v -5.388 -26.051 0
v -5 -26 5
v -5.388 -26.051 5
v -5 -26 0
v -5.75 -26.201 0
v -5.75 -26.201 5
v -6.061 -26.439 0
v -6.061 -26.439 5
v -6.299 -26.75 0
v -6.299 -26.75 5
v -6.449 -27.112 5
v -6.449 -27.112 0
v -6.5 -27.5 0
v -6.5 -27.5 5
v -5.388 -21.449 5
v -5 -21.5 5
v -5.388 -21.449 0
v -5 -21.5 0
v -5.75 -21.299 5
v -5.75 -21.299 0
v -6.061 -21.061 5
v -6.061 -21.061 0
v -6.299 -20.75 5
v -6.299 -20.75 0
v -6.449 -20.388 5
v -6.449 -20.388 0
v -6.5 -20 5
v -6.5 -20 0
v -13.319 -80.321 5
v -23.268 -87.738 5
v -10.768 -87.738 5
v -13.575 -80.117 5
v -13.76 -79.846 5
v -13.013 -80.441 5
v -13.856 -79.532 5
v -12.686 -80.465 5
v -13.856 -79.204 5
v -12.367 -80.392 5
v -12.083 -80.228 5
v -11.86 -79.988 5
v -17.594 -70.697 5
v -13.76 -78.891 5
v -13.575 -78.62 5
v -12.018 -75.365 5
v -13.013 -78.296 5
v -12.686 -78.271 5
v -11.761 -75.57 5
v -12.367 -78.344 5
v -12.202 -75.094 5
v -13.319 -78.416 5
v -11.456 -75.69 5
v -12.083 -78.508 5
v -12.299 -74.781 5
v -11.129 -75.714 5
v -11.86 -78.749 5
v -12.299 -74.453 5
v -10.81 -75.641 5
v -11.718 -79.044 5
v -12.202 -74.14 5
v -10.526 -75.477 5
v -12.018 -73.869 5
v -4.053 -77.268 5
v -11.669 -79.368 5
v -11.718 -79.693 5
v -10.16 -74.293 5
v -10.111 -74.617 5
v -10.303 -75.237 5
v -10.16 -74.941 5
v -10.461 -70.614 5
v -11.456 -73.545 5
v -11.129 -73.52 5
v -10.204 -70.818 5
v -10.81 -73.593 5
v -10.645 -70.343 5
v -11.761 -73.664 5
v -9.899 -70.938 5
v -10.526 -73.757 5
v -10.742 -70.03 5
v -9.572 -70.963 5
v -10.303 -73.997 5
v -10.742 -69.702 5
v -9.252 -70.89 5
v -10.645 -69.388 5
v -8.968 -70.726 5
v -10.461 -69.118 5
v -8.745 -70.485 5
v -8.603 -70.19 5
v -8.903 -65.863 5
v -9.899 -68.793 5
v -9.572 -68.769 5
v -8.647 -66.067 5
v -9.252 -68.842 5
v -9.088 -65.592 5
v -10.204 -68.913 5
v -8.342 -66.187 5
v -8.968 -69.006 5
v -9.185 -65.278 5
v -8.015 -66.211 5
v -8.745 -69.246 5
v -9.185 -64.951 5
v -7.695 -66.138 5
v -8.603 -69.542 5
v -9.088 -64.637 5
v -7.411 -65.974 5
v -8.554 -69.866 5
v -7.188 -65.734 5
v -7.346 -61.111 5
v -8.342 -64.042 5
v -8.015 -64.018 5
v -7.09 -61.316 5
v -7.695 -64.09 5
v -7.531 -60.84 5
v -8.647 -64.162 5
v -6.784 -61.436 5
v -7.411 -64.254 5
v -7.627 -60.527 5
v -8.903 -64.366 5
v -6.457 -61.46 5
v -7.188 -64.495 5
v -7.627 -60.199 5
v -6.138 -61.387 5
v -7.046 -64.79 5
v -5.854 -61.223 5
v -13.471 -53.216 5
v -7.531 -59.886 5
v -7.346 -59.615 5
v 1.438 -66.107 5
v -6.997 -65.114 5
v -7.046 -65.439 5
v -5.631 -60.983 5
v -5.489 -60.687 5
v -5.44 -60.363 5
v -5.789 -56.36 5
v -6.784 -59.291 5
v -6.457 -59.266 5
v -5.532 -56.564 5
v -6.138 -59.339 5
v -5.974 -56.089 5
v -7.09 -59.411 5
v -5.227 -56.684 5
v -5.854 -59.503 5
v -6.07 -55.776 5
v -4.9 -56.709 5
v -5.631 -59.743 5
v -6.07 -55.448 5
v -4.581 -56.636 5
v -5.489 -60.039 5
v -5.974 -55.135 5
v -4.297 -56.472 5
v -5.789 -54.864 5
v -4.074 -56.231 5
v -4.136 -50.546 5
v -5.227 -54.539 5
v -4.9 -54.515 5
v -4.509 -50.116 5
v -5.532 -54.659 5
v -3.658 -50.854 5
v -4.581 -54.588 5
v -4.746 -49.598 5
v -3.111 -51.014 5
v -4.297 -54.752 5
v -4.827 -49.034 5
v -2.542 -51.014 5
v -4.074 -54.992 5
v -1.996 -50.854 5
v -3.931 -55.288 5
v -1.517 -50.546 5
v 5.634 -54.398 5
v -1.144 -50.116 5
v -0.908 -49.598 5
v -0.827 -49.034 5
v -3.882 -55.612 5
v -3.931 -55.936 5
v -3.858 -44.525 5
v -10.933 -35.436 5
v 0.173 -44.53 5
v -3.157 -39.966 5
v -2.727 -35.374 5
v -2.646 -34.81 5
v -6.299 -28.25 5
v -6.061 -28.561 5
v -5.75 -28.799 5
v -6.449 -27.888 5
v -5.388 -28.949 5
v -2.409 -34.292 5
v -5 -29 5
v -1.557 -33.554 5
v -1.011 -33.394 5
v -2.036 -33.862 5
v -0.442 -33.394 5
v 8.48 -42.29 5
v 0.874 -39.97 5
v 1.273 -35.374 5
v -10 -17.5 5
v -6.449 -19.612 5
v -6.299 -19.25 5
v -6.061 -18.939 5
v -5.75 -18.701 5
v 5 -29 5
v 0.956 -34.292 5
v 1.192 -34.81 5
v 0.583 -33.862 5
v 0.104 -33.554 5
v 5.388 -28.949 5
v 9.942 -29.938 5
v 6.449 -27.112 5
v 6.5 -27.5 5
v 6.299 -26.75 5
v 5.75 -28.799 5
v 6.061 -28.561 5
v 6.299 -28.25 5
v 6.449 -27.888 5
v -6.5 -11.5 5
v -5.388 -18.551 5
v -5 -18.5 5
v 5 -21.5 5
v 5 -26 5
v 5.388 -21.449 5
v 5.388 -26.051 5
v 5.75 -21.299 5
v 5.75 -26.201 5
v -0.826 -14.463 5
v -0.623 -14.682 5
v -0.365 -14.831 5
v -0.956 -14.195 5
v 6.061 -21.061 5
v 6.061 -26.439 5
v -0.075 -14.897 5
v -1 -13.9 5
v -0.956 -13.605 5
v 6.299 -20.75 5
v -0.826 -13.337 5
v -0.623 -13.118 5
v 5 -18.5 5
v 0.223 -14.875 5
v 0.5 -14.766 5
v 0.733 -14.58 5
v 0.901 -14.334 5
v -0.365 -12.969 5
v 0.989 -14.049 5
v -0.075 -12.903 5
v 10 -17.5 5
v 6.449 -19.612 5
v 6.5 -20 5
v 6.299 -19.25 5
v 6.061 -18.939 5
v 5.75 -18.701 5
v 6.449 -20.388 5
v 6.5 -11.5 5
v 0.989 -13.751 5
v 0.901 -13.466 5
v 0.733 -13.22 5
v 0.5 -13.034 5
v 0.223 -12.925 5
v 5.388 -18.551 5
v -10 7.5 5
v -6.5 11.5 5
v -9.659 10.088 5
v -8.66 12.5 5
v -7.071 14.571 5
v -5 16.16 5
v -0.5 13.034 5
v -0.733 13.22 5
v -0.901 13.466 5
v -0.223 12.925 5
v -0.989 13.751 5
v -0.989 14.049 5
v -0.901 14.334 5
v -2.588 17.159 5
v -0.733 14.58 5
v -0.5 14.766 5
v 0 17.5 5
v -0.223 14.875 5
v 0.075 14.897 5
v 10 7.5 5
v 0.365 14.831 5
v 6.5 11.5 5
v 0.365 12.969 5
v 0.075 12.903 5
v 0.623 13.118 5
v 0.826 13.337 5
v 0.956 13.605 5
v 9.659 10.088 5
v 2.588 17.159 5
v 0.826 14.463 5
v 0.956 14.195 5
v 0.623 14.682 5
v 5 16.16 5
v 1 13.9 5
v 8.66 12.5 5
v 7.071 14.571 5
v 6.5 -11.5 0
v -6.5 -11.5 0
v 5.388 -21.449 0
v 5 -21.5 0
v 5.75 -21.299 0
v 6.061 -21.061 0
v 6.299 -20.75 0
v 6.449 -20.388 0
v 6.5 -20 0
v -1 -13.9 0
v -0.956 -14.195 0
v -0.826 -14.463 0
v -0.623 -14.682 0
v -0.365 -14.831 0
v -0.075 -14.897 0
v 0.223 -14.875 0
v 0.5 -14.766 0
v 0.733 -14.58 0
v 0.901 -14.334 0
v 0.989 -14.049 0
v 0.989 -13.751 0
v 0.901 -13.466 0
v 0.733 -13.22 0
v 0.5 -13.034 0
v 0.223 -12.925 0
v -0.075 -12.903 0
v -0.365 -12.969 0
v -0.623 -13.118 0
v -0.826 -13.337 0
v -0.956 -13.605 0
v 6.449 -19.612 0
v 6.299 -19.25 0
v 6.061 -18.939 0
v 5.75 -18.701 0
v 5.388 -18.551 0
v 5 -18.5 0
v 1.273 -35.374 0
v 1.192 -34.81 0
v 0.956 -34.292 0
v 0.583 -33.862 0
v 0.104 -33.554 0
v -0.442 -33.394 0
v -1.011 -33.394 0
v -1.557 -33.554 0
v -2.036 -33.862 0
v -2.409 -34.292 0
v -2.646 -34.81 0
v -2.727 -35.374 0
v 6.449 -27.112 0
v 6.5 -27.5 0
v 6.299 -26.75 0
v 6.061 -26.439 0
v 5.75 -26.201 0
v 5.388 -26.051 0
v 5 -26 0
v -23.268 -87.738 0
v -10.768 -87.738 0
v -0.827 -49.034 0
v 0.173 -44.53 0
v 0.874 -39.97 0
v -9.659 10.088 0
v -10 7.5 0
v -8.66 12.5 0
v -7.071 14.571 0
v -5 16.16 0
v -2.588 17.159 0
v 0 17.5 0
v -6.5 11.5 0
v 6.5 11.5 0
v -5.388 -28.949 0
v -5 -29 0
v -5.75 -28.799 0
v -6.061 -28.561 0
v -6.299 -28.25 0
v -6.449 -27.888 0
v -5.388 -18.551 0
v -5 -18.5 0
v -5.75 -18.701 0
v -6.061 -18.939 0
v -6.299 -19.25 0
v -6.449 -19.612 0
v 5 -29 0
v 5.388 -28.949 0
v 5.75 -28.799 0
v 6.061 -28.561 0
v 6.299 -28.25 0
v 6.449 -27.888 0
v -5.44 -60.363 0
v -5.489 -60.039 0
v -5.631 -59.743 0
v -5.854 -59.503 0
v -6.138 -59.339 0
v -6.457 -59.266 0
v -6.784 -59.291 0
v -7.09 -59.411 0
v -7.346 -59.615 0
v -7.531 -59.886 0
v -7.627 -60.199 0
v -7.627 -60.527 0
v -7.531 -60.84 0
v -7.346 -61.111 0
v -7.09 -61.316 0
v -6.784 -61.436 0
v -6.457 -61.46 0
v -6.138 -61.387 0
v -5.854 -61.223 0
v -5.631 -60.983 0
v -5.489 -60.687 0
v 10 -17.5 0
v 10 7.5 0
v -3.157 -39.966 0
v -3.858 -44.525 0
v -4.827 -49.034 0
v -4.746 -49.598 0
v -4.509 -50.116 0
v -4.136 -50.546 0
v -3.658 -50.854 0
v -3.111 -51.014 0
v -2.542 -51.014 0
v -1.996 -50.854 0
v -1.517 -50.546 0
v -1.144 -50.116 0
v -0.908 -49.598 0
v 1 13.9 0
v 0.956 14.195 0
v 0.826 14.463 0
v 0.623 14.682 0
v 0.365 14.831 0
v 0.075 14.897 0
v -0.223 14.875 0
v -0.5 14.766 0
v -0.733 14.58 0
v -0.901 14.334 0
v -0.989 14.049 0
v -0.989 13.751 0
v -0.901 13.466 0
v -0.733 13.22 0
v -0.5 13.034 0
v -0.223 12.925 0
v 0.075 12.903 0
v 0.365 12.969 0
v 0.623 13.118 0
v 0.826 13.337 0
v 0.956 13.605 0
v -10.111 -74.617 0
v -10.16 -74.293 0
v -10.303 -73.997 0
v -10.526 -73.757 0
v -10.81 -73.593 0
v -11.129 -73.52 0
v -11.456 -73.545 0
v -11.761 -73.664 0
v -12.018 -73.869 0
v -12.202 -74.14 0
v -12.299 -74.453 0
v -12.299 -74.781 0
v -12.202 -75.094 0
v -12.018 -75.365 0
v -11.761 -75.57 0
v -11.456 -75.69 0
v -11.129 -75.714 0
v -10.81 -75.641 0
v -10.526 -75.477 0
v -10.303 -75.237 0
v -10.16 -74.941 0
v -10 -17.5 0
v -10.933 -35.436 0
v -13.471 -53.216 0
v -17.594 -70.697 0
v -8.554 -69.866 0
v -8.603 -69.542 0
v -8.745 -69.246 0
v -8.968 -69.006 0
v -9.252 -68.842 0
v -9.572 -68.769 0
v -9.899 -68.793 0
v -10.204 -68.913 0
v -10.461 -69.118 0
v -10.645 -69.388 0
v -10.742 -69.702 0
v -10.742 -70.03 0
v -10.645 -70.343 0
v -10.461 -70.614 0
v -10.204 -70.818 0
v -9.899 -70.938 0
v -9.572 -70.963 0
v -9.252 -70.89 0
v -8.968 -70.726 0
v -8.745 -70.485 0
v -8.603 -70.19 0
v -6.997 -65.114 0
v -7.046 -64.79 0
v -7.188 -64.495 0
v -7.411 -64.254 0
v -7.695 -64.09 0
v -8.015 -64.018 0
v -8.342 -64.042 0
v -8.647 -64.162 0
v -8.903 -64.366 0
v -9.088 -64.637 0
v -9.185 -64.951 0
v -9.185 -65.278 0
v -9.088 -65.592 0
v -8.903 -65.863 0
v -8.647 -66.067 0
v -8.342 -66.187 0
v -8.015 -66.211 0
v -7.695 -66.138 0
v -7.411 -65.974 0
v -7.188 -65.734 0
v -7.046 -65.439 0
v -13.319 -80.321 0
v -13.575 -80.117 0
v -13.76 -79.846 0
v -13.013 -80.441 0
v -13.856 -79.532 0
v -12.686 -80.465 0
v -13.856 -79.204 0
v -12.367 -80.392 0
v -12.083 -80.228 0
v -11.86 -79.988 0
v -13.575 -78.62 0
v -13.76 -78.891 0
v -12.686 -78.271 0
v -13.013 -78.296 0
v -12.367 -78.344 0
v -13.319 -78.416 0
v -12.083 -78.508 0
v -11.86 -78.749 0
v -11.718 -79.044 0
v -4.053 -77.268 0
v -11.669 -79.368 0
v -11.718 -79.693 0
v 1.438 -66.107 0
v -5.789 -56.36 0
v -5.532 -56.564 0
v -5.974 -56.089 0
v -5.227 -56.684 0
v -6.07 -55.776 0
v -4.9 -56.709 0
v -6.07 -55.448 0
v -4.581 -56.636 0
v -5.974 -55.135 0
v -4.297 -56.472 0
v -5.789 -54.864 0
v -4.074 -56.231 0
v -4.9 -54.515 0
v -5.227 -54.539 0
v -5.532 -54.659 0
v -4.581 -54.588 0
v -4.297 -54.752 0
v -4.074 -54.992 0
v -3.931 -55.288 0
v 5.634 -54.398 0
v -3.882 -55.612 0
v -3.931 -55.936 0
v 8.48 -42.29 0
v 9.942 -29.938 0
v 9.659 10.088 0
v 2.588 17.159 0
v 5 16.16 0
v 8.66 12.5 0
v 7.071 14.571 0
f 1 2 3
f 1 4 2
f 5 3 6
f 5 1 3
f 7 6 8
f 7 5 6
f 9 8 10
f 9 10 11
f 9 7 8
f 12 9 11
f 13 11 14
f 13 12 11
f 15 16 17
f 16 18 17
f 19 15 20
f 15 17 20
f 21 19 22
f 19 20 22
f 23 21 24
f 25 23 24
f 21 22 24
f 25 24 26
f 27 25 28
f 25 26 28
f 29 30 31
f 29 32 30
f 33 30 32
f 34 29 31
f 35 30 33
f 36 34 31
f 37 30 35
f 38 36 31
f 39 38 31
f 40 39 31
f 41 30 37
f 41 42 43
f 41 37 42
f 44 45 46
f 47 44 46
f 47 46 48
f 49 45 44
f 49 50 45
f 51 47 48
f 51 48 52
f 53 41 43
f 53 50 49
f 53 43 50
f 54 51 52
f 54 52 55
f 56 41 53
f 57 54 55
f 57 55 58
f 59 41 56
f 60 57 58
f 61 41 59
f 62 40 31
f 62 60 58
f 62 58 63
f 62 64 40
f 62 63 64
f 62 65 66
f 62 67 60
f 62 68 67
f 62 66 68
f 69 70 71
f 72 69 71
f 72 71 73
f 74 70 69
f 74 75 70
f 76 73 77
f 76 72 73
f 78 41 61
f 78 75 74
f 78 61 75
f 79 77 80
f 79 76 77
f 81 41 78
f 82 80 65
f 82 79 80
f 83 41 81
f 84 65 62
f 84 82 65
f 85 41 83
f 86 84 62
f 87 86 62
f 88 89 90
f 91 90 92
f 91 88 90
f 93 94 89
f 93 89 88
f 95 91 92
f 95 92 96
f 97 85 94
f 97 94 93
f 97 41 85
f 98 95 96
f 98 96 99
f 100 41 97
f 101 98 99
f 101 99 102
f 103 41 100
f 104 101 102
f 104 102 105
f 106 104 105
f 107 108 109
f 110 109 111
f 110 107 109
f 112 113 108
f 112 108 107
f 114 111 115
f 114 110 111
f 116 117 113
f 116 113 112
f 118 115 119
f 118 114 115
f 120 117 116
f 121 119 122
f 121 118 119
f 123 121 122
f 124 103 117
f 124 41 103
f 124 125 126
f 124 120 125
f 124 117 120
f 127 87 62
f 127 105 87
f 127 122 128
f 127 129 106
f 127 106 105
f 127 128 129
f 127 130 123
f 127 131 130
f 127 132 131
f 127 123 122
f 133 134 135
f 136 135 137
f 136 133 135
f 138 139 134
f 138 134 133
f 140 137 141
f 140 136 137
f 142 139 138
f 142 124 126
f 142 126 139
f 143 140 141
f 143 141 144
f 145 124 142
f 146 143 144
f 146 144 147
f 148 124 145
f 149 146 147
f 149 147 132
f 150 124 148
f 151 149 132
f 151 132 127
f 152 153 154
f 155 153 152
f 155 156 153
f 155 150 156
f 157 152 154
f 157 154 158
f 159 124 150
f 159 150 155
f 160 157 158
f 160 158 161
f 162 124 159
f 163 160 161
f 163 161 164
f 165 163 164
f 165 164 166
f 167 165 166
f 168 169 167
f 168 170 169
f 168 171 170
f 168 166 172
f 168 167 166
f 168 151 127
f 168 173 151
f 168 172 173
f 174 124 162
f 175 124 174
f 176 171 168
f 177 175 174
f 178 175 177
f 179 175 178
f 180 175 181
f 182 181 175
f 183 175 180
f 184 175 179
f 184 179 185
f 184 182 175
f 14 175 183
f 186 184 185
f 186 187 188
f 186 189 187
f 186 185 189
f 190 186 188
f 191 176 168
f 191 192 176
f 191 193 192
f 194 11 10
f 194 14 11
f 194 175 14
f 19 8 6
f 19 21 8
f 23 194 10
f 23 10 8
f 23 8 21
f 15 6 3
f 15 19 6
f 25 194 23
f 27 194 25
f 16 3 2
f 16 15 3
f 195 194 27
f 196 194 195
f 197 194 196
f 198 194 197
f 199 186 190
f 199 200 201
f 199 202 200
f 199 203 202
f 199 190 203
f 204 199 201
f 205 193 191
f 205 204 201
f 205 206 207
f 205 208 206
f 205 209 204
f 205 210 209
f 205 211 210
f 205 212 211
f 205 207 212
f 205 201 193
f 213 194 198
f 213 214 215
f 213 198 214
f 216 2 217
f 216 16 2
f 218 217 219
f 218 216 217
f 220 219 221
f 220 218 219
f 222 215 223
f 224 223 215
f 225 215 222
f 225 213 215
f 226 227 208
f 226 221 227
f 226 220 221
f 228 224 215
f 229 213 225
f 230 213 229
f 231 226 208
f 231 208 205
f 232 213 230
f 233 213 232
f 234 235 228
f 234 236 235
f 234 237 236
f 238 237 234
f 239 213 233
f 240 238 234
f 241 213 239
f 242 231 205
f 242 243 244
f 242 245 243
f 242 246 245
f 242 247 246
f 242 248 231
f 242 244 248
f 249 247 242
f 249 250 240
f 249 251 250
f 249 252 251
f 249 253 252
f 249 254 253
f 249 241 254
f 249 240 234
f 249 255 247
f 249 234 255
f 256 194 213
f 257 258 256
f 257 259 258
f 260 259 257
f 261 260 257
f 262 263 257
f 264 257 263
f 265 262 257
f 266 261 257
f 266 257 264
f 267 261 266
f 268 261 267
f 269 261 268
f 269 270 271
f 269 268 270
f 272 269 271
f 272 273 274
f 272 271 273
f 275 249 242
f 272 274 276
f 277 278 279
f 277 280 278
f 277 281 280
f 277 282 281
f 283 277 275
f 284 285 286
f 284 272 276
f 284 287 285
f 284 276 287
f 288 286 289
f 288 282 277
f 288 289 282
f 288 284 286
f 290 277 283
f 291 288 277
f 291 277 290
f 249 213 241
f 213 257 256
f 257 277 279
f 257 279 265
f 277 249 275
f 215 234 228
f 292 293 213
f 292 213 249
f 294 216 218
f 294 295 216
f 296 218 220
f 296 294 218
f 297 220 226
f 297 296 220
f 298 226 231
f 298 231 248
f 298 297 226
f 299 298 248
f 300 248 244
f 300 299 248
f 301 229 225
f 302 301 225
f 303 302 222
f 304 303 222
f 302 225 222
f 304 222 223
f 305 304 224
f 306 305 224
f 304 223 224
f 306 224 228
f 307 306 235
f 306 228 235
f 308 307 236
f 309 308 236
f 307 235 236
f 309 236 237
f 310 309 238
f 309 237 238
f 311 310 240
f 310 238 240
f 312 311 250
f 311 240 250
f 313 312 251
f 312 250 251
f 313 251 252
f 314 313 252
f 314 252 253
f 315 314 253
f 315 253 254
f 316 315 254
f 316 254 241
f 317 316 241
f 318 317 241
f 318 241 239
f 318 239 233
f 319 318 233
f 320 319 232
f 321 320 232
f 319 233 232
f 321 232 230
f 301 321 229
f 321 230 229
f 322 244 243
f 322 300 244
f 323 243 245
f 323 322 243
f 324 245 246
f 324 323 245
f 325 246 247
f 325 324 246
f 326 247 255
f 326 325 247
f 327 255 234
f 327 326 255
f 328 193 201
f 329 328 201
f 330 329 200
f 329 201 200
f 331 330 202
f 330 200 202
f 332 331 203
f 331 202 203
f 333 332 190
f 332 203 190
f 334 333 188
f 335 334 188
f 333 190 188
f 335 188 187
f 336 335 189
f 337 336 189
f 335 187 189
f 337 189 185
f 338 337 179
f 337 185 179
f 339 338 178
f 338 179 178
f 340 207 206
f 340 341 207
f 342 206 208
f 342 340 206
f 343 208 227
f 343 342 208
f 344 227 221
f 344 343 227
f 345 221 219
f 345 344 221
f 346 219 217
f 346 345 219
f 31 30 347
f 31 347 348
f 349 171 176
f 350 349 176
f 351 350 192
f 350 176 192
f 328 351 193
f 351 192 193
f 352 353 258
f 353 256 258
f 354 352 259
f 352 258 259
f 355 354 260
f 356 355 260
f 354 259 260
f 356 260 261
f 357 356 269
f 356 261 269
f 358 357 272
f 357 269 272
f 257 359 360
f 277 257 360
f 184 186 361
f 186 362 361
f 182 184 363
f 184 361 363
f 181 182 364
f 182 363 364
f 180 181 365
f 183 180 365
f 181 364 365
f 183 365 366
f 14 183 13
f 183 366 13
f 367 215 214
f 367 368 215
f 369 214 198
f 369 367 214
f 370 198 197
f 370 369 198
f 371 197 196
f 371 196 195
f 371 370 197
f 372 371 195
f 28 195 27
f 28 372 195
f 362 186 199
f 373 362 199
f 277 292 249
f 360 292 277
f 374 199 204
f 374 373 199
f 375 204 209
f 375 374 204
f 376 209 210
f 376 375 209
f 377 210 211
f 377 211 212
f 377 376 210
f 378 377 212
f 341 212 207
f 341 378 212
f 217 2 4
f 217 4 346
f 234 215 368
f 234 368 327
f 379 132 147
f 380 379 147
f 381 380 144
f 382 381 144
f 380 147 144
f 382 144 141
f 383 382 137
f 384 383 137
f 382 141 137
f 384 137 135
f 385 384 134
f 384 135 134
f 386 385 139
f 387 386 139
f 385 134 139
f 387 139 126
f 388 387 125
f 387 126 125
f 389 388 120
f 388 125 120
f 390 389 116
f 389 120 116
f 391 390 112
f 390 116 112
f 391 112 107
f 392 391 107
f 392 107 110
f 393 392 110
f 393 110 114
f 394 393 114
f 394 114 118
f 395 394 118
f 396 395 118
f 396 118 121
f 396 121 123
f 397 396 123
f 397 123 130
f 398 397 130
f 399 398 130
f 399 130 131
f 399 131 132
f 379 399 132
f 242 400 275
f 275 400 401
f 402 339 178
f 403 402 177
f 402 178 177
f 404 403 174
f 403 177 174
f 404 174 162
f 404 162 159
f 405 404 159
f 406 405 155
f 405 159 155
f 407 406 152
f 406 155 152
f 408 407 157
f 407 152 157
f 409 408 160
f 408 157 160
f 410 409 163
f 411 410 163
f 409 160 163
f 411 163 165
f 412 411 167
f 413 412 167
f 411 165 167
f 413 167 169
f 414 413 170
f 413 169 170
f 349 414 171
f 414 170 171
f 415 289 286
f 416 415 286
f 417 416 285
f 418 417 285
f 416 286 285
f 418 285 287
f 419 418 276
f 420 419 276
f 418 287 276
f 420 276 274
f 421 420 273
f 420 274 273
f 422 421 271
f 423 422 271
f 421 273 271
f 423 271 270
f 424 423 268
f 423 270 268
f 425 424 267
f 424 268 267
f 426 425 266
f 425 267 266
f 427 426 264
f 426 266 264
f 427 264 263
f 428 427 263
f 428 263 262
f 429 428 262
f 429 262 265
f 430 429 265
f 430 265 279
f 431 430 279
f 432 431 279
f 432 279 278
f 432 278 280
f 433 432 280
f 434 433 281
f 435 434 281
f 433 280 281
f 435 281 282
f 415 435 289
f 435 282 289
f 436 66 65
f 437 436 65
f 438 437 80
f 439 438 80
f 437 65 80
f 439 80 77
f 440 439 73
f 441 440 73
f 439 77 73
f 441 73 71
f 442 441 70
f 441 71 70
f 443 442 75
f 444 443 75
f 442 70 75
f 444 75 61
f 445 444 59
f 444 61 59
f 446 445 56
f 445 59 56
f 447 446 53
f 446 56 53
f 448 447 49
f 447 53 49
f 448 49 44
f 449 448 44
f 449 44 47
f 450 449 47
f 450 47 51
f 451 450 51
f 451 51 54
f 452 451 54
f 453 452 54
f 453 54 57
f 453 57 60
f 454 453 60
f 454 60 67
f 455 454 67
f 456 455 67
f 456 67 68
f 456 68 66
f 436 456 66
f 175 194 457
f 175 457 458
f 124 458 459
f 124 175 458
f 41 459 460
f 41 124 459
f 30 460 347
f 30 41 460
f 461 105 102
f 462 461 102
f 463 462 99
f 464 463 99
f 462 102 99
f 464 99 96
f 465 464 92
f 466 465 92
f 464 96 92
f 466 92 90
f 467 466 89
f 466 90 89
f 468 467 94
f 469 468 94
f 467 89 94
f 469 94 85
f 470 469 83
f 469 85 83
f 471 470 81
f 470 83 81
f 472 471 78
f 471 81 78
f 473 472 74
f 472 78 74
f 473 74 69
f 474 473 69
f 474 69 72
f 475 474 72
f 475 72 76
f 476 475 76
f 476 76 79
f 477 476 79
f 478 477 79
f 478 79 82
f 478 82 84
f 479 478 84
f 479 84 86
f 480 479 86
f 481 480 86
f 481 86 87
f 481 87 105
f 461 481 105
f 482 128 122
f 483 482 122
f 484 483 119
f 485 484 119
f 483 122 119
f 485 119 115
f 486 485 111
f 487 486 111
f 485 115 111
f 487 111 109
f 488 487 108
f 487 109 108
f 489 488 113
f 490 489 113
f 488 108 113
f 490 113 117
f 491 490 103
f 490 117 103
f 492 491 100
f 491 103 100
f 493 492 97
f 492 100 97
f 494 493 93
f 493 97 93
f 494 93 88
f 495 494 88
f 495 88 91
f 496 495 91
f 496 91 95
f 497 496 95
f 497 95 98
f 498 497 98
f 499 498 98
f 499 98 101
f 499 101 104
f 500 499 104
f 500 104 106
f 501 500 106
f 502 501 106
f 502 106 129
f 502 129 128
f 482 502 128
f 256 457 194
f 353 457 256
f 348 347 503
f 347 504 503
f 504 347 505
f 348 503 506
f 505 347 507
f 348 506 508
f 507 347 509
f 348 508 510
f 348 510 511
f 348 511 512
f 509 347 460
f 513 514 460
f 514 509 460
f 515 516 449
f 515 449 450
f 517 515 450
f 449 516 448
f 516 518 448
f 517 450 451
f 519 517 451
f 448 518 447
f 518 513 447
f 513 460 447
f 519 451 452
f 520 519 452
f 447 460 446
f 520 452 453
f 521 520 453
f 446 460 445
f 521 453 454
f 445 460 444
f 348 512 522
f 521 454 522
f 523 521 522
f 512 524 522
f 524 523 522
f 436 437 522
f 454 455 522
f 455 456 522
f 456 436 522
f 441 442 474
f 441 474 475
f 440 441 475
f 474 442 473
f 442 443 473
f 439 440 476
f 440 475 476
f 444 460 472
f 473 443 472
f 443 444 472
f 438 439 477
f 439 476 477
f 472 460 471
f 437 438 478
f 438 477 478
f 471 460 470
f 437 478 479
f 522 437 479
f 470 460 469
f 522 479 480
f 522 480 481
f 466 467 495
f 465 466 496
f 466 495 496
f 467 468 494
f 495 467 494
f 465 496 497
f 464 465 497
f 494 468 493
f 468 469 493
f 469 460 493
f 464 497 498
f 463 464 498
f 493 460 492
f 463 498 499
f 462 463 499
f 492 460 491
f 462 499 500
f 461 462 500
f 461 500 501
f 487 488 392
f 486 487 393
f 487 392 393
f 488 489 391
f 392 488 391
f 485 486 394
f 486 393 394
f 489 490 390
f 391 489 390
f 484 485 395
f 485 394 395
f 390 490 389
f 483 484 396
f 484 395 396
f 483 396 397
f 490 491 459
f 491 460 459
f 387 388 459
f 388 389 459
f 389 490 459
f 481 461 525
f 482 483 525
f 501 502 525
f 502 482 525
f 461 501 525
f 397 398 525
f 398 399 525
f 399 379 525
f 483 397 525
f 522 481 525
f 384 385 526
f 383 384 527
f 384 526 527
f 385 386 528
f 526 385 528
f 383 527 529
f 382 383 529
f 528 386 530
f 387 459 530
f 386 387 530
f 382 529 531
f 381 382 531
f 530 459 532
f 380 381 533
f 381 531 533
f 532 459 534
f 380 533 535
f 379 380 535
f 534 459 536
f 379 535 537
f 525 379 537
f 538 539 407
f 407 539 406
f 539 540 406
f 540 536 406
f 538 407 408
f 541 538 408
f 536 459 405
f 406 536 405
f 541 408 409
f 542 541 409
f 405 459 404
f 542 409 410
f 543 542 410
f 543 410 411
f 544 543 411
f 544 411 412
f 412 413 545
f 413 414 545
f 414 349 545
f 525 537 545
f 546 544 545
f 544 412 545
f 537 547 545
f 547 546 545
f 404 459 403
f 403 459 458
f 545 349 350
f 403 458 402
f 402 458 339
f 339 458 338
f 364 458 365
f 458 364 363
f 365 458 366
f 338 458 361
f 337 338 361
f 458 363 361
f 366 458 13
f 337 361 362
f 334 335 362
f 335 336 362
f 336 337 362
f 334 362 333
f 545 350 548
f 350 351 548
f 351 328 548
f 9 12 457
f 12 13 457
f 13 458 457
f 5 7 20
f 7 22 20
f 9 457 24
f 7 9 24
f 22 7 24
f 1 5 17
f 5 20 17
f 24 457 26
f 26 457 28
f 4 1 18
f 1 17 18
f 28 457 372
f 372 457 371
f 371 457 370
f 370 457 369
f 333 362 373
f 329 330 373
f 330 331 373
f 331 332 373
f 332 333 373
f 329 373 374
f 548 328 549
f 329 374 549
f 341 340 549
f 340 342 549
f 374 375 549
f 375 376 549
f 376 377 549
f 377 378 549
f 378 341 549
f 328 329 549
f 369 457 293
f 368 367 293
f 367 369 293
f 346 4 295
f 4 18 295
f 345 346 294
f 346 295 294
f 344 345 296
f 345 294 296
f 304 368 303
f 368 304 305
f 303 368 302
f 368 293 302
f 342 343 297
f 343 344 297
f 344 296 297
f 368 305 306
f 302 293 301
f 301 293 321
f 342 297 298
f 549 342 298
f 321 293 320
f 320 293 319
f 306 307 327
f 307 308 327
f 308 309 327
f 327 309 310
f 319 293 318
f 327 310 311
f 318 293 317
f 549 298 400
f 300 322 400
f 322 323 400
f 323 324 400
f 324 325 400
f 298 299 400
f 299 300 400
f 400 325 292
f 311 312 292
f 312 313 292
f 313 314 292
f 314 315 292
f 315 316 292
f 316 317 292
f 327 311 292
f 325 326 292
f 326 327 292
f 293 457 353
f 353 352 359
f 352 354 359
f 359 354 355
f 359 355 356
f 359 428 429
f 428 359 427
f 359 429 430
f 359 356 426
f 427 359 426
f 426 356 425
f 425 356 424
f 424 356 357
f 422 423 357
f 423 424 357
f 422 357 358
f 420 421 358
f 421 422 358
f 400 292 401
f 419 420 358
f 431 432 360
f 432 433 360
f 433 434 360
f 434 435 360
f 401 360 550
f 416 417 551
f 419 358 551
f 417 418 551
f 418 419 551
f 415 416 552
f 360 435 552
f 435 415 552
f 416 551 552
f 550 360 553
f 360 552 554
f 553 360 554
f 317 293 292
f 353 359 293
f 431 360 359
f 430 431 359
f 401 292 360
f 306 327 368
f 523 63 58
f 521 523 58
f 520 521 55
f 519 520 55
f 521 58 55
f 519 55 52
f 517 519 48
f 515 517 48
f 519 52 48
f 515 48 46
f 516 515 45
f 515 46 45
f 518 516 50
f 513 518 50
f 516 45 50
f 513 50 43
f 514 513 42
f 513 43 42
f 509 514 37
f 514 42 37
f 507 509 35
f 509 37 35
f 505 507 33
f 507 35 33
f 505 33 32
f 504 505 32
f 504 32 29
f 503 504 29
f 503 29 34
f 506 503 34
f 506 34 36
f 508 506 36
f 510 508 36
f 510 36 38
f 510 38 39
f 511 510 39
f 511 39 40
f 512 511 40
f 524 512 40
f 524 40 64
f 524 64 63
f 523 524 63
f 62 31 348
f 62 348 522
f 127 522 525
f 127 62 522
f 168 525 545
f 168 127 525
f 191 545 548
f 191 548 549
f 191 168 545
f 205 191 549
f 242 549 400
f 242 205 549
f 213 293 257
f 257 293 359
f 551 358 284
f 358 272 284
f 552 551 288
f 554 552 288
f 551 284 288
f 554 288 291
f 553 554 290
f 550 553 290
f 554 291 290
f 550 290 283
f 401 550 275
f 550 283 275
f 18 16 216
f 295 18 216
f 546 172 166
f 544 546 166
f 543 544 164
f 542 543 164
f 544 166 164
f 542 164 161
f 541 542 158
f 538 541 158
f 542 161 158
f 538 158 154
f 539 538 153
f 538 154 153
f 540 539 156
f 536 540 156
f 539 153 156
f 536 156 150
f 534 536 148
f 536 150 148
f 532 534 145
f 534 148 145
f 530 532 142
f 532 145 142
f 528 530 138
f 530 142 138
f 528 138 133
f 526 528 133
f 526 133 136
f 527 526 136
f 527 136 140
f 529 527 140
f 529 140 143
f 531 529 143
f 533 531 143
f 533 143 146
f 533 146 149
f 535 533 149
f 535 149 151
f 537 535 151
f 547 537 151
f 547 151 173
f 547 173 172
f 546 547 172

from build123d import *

# Parameters (mm, degrees)
SKETCH1_W           = 20
SKETCH1_H           = 35
SKETCH1_W_2         = 13
SKETCH1_H_2         = 23
BOSS_EXTRUDE1_DEPTH = 5
SKETCH2_R           = 1
CUT_EXTRUDE1_DEPTH  = 5
BOSS_EXTRUDE2_DEPTH = 5
FILLET1_R           = 10
SKETCH6_R           = 1.1
CUT_EXTRUDE2_DEPTH  = 10
SKETCH7_W           = 13
SKETCH7_H           = 3
CUT_EXTRUDE3_DEPTH  = 10
FILLET2_R           = 1.5


with BuildPart() as part:
    # Sketch1 → Boss-Extrude1 (new body)
    with BuildSketch(Plane.XY):
        Rectangle(SKETCH1_W, SKETCH1_H)
        Rectangle(SKETCH1_W_2, SKETCH1_H_2, mode=Mode.SUBTRACT)
    extrude(amount=BOSS_EXTRUDE1_DEPTH)

    # Sketch2 → Cut-Extrude1 (cut)
    with BuildSketch(Plane.XY.offset(5)):
        with Locations((0, 13.9)):
            Circle(SKETCH2_R)
        with Locations(Location((0, -13.9, 0), (0, 0, 180))):
            Circle(SKETCH2_R)
    extrude(amount=-CUT_EXTRUDE1_DEPTH, mode=Mode.SUBTRACT)

    # Sketch4 → Boss-Extrude2 (add)
    with BuildSketch(Plane.XY.offset(5)):
        with BuildLine():
            Line((0, -17.5), (-10, -17.5))
            ThreePointArc((-10, -17.5), (-13.470780797, -53.21636341), (-23.268193188, -87.737598108))
            Line((-23.268193188, -87.737598108), (-10.768193188, -87.737598108))
            ThreePointArc((-10.768193188, -87.737598108), (5.633525229, -54.39811862), (10, -17.5))
            Line((10, -17.5), (0, -17.5))
        make_face()
    extrude(amount=-BOSS_EXTRUDE2_DEPTH)

    # Fillet1
    fillet1_edges = [part.edges().sort_by_distance(p)[0] for p in [
        (-10, 17.5, 2.5),
        (10, 17.5, 2.5),
    ]]
    fillet(fillet1_edges, radius=FILLET1_R - 0.0001)  # a hair under: the kernel refuses the full size

    # Sketch6 → Cut-Extrude2 (cut)
    with BuildSketch(Plane.XY.offset(5)):
        with Locations((-12.768649296, -79.368399131)):
            Circle(SKETCH6_R)
        with BuildLine():
            ThreePointArc((1.273336761, -35.373649828), (-0.726663239, -33.373649828), (-2.726663239, -35.373649828))
            ThreePointArc((-2.726663239, -35.373649828), (-3.473502661, -42.250603024), (-4.826684161, -49.034344928))
            ThreePointArc((-4.826684161, -49.034344928), (-2.826684161, -51.034344928), (-0.826684161, -49.034344928))
            ThreePointArc((-0.826684161, -49.034344928), (0.561306745, -42.255954178), (1.273336761, -35.373649828))
        make_face()
        with Locations((-11.211408841, -74.617083296)):
            Circle(SKETCH6_R)
        with Locations((-9.654168385, -69.865767461)):
            Circle(SKETCH6_R)
        with Locations((-8.09692793, -65.114451626)):
            Circle(SKETCH6_R)
        with Locations((-6.539687475, -60.363135791)):
            Circle(SKETCH6_R)
        with Locations((-4.98244702, -55.611819955)):
            Circle(SKETCH6_R)
    extrude(amount=-CUT_EXTRUDE2_DEPTH, mode=Mode.SUBTRACT)

    # Sketch7 → Cut-Extrude3 (cut)
    with BuildSketch(Plane.XY.offset(5)):
        with Locations((0, -27.5)):
            Rectangle(SKETCH7_W, SKETCH7_H)
        with Locations((0, -20)):
            Rectangle(SKETCH7_W, SKETCH7_H)
    extrude(amount=-CUT_EXTRUDE3_DEPTH, mode=Mode.SUBTRACT)

    # Fillet2
    fillet2_edges = [part.edges().sort_by_distance(p)[0] for p in [
        (6.5, -26, 2.5),
        (6.5, -29, 2.5),
        (-6.5, -29, 2.5),
        (-6.5, -26, 2.5),
        (6.5, -21.5, 2.5),
        (6.5, -18.5, 2.5),
        (-6.5, -21.5, 2.5),
        (-6.5, -18.5, 2.5),
    ]]
    fillet(fillet2_edges, radius=FILLET2_R - 0.0001)  # a hair under: the kernel refuses the full size


solid = part.part
